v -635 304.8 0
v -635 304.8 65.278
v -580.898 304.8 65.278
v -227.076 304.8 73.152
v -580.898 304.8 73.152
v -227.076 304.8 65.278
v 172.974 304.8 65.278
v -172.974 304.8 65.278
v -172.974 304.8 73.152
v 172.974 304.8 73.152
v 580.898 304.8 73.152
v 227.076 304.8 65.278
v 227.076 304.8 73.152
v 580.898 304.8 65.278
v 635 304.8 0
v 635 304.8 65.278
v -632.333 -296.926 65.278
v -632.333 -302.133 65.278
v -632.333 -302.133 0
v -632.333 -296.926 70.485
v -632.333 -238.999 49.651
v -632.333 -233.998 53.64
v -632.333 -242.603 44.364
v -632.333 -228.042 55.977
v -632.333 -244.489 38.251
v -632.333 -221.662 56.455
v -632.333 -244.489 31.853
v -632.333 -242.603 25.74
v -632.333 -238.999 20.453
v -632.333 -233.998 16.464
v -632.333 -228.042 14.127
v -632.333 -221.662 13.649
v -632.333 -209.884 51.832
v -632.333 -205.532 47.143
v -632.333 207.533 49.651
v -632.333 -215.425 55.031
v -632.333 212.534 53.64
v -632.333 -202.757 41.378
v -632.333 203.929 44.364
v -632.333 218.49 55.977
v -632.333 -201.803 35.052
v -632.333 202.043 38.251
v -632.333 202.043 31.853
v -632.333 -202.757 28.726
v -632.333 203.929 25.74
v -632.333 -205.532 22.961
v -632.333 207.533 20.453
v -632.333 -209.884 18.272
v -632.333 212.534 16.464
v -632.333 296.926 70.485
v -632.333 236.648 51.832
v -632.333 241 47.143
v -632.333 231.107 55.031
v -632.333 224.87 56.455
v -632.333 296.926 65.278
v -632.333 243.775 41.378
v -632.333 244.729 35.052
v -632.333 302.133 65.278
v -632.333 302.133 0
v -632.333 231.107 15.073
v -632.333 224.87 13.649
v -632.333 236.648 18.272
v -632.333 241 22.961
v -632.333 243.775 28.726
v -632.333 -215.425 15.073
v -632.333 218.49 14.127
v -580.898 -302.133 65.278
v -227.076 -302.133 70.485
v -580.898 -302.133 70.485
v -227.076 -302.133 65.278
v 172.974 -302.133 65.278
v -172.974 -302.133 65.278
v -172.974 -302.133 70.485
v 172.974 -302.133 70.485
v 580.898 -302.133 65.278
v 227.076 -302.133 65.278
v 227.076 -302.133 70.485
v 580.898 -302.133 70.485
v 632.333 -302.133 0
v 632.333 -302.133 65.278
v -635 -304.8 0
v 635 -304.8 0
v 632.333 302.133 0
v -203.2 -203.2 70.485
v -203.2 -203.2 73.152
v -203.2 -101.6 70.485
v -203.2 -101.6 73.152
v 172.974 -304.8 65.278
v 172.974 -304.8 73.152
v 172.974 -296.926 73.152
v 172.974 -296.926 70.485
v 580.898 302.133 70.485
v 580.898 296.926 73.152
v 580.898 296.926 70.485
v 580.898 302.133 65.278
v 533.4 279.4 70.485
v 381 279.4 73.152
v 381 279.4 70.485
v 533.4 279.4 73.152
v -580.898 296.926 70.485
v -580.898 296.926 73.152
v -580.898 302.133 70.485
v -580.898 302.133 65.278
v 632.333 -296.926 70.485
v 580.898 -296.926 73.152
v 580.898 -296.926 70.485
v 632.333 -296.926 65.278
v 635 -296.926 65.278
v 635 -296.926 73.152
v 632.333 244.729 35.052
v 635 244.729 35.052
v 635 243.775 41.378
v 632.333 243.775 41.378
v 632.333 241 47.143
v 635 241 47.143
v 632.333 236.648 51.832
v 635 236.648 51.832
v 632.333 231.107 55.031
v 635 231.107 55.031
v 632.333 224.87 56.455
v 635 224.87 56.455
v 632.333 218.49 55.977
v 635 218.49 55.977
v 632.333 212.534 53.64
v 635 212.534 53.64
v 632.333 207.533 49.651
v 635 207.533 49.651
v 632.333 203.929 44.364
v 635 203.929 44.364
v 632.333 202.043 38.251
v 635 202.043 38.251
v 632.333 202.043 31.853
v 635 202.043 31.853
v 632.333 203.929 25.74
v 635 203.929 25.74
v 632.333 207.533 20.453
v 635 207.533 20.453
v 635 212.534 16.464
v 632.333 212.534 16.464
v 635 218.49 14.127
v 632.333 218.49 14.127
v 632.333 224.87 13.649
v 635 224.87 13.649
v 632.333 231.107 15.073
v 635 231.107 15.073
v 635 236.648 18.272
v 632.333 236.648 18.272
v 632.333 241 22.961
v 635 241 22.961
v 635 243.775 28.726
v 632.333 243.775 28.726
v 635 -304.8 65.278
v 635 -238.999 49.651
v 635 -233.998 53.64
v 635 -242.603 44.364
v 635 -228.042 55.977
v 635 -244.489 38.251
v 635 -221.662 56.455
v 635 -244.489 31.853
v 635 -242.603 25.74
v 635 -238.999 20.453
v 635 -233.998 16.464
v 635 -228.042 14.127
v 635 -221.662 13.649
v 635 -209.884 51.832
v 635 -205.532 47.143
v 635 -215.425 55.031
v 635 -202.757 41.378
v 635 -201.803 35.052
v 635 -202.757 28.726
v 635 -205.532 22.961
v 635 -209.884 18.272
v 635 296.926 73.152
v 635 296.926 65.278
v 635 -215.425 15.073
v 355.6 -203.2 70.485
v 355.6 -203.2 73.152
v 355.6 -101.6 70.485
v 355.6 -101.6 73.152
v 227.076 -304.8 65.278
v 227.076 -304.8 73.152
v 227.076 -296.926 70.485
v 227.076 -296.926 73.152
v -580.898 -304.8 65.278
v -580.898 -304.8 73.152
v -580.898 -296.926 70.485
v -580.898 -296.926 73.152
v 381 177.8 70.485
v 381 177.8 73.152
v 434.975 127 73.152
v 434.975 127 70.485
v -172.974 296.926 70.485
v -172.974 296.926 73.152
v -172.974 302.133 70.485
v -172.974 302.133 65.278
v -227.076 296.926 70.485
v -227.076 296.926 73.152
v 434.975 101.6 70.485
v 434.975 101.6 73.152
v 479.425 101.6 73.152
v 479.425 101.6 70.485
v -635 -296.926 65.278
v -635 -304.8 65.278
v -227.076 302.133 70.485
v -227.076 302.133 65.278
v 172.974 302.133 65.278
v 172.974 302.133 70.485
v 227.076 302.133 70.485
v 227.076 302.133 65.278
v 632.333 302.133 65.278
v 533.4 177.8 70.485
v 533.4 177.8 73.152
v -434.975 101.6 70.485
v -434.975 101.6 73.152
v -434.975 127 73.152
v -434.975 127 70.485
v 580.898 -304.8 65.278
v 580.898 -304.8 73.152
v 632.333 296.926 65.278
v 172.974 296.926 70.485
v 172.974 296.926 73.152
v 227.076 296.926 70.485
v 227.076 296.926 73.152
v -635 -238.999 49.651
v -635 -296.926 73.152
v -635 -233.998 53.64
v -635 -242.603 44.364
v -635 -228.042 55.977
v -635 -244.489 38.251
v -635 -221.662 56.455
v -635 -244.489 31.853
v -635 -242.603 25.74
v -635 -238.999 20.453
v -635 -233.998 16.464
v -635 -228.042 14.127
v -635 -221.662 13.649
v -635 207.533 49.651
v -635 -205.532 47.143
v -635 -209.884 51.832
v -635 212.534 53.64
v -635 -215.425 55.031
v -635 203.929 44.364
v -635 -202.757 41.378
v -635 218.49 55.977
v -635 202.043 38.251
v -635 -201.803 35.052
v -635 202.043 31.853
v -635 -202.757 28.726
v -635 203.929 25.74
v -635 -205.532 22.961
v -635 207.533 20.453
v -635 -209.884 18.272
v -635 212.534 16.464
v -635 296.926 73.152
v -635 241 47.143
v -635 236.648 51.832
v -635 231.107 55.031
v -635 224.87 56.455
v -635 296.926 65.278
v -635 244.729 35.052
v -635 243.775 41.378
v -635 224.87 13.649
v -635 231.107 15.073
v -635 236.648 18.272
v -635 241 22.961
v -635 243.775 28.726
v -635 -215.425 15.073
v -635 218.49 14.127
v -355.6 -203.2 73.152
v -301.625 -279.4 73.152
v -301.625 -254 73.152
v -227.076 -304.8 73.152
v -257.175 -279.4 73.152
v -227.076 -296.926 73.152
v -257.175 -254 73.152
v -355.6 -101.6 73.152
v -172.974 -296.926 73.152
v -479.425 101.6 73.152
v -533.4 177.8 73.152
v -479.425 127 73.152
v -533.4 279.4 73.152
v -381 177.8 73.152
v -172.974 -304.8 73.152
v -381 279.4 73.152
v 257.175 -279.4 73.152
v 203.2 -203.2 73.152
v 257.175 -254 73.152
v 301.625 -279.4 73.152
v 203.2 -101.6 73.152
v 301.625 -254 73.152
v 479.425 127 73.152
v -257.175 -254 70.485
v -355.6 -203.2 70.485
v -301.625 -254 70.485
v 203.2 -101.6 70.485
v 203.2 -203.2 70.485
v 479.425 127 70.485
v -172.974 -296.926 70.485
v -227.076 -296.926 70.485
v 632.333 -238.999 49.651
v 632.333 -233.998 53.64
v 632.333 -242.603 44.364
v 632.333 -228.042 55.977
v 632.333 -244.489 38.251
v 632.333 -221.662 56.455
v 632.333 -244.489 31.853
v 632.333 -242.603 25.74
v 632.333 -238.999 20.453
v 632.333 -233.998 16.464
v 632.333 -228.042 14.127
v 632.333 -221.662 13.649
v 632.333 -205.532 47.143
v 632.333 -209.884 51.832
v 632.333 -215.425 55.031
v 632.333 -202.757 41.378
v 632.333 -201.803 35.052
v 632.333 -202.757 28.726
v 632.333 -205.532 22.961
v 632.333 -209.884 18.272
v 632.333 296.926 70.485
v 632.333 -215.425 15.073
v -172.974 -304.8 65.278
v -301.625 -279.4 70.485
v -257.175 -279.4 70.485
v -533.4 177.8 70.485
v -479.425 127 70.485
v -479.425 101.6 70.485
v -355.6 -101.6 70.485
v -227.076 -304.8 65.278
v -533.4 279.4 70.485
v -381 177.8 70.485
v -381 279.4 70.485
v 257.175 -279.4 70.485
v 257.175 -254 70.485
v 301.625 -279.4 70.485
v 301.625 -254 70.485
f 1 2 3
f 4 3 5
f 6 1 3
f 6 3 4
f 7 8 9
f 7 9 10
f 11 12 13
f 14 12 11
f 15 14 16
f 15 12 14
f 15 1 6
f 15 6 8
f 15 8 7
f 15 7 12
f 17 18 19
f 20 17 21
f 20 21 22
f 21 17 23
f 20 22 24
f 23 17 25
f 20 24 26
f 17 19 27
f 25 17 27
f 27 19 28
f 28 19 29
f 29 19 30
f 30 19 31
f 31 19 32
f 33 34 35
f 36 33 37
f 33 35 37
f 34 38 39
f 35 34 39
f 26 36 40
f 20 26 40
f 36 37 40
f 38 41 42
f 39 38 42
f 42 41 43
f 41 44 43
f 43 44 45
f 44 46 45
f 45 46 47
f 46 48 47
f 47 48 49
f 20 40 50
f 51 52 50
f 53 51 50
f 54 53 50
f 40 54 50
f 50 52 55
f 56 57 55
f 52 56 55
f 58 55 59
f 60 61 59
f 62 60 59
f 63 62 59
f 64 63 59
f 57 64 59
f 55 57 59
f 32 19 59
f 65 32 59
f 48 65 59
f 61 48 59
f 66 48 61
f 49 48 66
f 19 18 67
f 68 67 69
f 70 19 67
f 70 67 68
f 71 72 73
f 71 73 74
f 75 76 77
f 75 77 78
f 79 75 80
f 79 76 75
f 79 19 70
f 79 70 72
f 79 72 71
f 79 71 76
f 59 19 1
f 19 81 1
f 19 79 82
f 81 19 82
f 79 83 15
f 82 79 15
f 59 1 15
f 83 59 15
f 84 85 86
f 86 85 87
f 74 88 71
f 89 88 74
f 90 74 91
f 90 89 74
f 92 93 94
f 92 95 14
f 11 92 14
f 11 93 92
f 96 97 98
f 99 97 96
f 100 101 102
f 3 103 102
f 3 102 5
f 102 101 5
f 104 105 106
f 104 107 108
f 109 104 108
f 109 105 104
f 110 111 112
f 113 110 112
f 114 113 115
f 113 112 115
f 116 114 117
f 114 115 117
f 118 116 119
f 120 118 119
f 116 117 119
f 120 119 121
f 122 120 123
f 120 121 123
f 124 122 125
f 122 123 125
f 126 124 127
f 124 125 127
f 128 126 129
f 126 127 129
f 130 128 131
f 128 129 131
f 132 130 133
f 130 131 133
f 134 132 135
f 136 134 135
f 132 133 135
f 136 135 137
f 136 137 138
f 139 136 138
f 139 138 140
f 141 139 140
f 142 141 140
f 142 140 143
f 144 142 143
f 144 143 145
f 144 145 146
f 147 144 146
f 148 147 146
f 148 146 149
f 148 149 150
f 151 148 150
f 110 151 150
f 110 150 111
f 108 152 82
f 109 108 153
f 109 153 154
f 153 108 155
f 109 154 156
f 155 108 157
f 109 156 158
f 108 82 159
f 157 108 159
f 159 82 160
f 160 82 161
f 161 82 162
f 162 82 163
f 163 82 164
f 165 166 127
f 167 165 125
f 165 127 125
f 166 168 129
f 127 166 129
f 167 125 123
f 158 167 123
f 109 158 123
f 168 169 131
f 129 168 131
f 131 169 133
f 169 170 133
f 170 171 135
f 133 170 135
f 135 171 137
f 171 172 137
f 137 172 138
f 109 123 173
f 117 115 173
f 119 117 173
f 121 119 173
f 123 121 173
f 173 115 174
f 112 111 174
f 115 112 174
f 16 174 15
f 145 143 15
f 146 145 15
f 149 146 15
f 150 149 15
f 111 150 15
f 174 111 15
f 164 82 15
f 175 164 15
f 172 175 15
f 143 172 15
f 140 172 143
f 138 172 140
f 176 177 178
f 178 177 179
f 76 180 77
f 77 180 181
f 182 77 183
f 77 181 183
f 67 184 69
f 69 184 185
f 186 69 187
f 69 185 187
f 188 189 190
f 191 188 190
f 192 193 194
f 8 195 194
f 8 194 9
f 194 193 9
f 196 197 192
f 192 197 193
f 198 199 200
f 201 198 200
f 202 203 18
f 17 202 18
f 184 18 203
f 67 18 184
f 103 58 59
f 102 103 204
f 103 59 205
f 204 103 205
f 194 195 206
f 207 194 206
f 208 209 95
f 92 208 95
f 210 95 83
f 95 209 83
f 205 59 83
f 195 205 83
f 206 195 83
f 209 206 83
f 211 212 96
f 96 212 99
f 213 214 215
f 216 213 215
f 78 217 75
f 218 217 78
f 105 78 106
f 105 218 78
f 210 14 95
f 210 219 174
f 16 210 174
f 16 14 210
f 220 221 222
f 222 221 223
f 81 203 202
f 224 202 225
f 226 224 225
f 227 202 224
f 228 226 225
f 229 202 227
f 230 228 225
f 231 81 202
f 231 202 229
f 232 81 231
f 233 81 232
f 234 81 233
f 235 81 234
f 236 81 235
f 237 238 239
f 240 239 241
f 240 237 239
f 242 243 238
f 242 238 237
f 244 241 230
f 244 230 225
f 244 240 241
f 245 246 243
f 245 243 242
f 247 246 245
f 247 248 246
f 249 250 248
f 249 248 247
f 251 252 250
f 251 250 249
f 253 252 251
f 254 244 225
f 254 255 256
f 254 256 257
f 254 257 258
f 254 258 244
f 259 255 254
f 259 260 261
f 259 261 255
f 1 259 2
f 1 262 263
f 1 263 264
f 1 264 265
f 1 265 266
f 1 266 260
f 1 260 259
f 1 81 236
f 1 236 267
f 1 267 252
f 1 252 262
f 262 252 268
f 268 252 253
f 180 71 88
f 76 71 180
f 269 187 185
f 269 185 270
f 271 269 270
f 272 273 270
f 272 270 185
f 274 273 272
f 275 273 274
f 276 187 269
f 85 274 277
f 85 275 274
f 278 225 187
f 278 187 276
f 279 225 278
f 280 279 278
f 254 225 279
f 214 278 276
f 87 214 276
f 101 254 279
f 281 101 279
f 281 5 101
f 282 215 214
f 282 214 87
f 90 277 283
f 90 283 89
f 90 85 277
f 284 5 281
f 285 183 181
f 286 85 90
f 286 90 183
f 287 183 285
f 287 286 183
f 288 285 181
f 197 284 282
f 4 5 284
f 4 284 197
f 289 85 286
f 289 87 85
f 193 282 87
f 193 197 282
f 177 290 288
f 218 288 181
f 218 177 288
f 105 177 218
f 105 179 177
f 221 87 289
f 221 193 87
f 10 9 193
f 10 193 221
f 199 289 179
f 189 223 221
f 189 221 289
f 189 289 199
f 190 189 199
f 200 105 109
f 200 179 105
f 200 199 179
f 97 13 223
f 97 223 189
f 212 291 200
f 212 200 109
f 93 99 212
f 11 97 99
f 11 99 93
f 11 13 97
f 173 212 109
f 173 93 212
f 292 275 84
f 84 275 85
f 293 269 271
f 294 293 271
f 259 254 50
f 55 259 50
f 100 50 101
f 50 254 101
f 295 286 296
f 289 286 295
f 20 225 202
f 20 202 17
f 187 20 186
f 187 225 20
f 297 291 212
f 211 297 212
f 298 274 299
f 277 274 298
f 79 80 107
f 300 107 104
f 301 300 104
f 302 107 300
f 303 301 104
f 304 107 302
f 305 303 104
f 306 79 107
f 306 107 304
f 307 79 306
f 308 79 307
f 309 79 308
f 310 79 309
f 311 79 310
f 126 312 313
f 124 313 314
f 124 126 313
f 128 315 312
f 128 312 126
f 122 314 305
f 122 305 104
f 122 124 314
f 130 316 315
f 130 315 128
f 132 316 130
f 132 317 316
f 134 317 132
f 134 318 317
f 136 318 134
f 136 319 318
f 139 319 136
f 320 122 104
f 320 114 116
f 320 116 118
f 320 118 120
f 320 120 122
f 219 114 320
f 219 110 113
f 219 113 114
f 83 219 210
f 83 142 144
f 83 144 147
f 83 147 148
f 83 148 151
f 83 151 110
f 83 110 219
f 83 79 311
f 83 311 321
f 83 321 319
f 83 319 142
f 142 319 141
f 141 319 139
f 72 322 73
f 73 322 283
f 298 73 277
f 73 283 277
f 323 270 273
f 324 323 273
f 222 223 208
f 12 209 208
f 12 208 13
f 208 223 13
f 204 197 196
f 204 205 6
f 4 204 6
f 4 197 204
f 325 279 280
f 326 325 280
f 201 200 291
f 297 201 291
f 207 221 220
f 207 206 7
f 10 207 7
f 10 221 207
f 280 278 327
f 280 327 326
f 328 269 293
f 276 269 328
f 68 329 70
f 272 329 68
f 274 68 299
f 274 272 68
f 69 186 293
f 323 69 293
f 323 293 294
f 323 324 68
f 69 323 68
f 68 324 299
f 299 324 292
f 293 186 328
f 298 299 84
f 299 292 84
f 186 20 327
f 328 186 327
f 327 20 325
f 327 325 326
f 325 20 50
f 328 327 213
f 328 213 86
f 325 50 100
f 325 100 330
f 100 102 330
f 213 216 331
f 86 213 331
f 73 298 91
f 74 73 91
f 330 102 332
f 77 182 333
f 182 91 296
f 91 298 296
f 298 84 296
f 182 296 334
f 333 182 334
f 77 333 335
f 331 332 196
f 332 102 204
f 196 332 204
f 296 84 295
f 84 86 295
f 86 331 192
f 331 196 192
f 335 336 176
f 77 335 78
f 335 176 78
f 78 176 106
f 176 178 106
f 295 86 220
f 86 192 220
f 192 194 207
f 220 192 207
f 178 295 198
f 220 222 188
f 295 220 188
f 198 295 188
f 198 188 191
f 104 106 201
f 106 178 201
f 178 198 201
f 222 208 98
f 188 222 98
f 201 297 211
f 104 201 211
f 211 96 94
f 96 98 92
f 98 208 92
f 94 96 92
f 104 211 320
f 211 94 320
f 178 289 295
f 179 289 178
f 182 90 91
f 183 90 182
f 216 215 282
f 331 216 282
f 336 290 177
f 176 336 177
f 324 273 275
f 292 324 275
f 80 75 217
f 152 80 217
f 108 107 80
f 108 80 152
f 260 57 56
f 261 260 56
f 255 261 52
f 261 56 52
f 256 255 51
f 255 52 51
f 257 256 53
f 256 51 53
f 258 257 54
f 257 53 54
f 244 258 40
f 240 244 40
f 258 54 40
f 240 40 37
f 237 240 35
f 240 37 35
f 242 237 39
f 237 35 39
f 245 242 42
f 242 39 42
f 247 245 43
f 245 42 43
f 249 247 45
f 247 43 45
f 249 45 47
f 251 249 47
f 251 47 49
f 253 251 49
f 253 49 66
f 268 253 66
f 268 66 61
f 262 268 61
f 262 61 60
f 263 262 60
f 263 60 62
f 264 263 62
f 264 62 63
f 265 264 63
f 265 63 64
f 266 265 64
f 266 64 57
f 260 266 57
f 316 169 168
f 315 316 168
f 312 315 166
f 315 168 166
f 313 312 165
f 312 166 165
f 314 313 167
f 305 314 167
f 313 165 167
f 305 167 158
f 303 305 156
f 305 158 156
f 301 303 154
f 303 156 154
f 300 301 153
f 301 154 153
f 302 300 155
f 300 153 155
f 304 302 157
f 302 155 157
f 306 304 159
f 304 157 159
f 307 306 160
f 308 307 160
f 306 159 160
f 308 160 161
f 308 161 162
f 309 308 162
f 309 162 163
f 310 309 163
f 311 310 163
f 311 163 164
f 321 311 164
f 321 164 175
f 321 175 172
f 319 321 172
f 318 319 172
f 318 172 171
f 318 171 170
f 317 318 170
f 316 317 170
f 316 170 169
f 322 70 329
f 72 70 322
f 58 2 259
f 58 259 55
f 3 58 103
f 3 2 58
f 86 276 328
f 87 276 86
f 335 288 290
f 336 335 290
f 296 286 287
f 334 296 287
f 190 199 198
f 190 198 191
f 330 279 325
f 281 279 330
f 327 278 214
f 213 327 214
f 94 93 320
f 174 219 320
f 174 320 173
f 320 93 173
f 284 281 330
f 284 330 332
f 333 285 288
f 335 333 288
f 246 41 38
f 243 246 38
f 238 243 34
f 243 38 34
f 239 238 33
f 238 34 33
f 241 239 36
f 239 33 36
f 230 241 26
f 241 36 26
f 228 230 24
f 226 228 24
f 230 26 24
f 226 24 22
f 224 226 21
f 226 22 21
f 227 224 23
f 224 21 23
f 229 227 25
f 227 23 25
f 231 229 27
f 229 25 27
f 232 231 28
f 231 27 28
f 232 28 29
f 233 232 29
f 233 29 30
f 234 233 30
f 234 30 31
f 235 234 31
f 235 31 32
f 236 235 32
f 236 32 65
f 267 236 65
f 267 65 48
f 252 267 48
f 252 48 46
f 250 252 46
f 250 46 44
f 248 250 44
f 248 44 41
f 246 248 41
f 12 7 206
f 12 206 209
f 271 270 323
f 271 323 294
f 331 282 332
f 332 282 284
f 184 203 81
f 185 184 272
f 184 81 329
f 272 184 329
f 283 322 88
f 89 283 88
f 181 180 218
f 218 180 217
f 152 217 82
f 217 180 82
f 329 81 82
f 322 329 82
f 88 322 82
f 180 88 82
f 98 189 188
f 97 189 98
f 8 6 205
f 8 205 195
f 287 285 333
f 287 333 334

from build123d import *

# Parameters (mm, degrees)
F0_W     = 1270
F0_H     = 609.6
F1_DEPTH = 73.152
F2_T     = -2.667
F3_W     = 152.4
F3_H     = 101.6
F3_W_2   = 44.45
F3_H_2   = 25.4
F4_DEPTH = 73.153
F5_W     = 54.102
F5_H     = 7.874
F6_DEPTH = 7.874
F7_R     = 21.463
F8_DEPTH = 1270.001


with BuildPart() as f1:
    # F0 (on Top) → F1 (new body)
    with BuildSketch(Plane.XY):
        Rectangle(F0_W, F0_H)
    extrude(amount=F1_DEPTH)

    # F2
    f2_openings = [f1.faces().sort_by_distance(p)[0] for p in [
        (0, 0, 0),
    ]]
    offset(amount=F2_T, openings=f2_openings)

    # F3 (on face) → F4 (cut, through all)
    with BuildSketch(Plane.XY.offset(73.152)):
        with Locations((-457.2, 228.6)):
            Rectangle(F3_W, F3_H)
        Polygon((-434.975, 127), (-381, 177.8), (-533.4, 177.8), (-479.425, 127), align=None)
        with Locations((-457.2, 114.3)):
            Rectangle(F3_W_2, F3_H_2)
        with Locations((-279.4, -152.4)):
            Rectangle(F3_W, F3_H)
        Polygon((-355.6, -203.2), (-301.625, -254), (-257.175, -254), (-203.2, -203.2), align=None)
        with Locations((-279.4, -266.7)):
            Rectangle(F3_W_2, F3_H_2)
        with Locations((279.4, -266.7)):
            Rectangle(F3_W_2, F3_H_2)
        with Locations((279.4, -152.4)):
            Rectangle(F3_W, F3_H)
        with Locations((457.2, 114.3)):
            Rectangle(F3_W_2, F3_H_2)
        Polygon((381, 177.8), (434.975, 127), (479.425, 127), (533.4, 177.8), align=None)
        with Locations((457.2, 228.6)):
            Rectangle(F3_W, F3_H)
        Polygon((203.2, -203.2), (257.175, -254), (301.625, -254), (355.6, -203.2), align=None)
    extrude(amount=-F4_DEPTH, mode=Mode.SUBTRACT)

    # F5 (on face) → F6 (cut)
    with BuildSketch(Plane.XY.offset(73.152)):
        with Locations((-607.949, 300.863)):
            Rectangle(F5_W, F5_H)
        with Locations((-200.025, 300.863)):
            Rectangle(F5_W, F5_H)
        with Locations((200.025, 300.863)):
            Rectangle(F5_W, F5_H)
        with Locations((607.949, 300.863)):
            Rectangle(F5_W, F5_H)
        with Locations((607.949, -300.863)):
            Rectangle(F5_W, F5_H)
        with Locations((200.025, -300.863)):
            Rectangle(F5_W, F5_H)
        with Locations((-200.025, -300.863)):
            Rectangle(F5_W, F5_H)
        with Locations((-607.949, -300.863)):
            Rectangle(F5_W, F5_H)
    extrude(amount=-F6_DEPTH, mode=Mode.SUBTRACT)

    # F7 (on face) → F8 (cut, through all)
    with BuildSketch(Plane.YZ.offset(635)):
        with Locations((223.266, 35.052)):
            Circle(F7_R)
        with Locations((-223.266, 35.052)):
            Circle(F7_R)
    extrude(amount=-F8_DEPTH, mode=Mode.SUBTRACT)


solid = f1.part
